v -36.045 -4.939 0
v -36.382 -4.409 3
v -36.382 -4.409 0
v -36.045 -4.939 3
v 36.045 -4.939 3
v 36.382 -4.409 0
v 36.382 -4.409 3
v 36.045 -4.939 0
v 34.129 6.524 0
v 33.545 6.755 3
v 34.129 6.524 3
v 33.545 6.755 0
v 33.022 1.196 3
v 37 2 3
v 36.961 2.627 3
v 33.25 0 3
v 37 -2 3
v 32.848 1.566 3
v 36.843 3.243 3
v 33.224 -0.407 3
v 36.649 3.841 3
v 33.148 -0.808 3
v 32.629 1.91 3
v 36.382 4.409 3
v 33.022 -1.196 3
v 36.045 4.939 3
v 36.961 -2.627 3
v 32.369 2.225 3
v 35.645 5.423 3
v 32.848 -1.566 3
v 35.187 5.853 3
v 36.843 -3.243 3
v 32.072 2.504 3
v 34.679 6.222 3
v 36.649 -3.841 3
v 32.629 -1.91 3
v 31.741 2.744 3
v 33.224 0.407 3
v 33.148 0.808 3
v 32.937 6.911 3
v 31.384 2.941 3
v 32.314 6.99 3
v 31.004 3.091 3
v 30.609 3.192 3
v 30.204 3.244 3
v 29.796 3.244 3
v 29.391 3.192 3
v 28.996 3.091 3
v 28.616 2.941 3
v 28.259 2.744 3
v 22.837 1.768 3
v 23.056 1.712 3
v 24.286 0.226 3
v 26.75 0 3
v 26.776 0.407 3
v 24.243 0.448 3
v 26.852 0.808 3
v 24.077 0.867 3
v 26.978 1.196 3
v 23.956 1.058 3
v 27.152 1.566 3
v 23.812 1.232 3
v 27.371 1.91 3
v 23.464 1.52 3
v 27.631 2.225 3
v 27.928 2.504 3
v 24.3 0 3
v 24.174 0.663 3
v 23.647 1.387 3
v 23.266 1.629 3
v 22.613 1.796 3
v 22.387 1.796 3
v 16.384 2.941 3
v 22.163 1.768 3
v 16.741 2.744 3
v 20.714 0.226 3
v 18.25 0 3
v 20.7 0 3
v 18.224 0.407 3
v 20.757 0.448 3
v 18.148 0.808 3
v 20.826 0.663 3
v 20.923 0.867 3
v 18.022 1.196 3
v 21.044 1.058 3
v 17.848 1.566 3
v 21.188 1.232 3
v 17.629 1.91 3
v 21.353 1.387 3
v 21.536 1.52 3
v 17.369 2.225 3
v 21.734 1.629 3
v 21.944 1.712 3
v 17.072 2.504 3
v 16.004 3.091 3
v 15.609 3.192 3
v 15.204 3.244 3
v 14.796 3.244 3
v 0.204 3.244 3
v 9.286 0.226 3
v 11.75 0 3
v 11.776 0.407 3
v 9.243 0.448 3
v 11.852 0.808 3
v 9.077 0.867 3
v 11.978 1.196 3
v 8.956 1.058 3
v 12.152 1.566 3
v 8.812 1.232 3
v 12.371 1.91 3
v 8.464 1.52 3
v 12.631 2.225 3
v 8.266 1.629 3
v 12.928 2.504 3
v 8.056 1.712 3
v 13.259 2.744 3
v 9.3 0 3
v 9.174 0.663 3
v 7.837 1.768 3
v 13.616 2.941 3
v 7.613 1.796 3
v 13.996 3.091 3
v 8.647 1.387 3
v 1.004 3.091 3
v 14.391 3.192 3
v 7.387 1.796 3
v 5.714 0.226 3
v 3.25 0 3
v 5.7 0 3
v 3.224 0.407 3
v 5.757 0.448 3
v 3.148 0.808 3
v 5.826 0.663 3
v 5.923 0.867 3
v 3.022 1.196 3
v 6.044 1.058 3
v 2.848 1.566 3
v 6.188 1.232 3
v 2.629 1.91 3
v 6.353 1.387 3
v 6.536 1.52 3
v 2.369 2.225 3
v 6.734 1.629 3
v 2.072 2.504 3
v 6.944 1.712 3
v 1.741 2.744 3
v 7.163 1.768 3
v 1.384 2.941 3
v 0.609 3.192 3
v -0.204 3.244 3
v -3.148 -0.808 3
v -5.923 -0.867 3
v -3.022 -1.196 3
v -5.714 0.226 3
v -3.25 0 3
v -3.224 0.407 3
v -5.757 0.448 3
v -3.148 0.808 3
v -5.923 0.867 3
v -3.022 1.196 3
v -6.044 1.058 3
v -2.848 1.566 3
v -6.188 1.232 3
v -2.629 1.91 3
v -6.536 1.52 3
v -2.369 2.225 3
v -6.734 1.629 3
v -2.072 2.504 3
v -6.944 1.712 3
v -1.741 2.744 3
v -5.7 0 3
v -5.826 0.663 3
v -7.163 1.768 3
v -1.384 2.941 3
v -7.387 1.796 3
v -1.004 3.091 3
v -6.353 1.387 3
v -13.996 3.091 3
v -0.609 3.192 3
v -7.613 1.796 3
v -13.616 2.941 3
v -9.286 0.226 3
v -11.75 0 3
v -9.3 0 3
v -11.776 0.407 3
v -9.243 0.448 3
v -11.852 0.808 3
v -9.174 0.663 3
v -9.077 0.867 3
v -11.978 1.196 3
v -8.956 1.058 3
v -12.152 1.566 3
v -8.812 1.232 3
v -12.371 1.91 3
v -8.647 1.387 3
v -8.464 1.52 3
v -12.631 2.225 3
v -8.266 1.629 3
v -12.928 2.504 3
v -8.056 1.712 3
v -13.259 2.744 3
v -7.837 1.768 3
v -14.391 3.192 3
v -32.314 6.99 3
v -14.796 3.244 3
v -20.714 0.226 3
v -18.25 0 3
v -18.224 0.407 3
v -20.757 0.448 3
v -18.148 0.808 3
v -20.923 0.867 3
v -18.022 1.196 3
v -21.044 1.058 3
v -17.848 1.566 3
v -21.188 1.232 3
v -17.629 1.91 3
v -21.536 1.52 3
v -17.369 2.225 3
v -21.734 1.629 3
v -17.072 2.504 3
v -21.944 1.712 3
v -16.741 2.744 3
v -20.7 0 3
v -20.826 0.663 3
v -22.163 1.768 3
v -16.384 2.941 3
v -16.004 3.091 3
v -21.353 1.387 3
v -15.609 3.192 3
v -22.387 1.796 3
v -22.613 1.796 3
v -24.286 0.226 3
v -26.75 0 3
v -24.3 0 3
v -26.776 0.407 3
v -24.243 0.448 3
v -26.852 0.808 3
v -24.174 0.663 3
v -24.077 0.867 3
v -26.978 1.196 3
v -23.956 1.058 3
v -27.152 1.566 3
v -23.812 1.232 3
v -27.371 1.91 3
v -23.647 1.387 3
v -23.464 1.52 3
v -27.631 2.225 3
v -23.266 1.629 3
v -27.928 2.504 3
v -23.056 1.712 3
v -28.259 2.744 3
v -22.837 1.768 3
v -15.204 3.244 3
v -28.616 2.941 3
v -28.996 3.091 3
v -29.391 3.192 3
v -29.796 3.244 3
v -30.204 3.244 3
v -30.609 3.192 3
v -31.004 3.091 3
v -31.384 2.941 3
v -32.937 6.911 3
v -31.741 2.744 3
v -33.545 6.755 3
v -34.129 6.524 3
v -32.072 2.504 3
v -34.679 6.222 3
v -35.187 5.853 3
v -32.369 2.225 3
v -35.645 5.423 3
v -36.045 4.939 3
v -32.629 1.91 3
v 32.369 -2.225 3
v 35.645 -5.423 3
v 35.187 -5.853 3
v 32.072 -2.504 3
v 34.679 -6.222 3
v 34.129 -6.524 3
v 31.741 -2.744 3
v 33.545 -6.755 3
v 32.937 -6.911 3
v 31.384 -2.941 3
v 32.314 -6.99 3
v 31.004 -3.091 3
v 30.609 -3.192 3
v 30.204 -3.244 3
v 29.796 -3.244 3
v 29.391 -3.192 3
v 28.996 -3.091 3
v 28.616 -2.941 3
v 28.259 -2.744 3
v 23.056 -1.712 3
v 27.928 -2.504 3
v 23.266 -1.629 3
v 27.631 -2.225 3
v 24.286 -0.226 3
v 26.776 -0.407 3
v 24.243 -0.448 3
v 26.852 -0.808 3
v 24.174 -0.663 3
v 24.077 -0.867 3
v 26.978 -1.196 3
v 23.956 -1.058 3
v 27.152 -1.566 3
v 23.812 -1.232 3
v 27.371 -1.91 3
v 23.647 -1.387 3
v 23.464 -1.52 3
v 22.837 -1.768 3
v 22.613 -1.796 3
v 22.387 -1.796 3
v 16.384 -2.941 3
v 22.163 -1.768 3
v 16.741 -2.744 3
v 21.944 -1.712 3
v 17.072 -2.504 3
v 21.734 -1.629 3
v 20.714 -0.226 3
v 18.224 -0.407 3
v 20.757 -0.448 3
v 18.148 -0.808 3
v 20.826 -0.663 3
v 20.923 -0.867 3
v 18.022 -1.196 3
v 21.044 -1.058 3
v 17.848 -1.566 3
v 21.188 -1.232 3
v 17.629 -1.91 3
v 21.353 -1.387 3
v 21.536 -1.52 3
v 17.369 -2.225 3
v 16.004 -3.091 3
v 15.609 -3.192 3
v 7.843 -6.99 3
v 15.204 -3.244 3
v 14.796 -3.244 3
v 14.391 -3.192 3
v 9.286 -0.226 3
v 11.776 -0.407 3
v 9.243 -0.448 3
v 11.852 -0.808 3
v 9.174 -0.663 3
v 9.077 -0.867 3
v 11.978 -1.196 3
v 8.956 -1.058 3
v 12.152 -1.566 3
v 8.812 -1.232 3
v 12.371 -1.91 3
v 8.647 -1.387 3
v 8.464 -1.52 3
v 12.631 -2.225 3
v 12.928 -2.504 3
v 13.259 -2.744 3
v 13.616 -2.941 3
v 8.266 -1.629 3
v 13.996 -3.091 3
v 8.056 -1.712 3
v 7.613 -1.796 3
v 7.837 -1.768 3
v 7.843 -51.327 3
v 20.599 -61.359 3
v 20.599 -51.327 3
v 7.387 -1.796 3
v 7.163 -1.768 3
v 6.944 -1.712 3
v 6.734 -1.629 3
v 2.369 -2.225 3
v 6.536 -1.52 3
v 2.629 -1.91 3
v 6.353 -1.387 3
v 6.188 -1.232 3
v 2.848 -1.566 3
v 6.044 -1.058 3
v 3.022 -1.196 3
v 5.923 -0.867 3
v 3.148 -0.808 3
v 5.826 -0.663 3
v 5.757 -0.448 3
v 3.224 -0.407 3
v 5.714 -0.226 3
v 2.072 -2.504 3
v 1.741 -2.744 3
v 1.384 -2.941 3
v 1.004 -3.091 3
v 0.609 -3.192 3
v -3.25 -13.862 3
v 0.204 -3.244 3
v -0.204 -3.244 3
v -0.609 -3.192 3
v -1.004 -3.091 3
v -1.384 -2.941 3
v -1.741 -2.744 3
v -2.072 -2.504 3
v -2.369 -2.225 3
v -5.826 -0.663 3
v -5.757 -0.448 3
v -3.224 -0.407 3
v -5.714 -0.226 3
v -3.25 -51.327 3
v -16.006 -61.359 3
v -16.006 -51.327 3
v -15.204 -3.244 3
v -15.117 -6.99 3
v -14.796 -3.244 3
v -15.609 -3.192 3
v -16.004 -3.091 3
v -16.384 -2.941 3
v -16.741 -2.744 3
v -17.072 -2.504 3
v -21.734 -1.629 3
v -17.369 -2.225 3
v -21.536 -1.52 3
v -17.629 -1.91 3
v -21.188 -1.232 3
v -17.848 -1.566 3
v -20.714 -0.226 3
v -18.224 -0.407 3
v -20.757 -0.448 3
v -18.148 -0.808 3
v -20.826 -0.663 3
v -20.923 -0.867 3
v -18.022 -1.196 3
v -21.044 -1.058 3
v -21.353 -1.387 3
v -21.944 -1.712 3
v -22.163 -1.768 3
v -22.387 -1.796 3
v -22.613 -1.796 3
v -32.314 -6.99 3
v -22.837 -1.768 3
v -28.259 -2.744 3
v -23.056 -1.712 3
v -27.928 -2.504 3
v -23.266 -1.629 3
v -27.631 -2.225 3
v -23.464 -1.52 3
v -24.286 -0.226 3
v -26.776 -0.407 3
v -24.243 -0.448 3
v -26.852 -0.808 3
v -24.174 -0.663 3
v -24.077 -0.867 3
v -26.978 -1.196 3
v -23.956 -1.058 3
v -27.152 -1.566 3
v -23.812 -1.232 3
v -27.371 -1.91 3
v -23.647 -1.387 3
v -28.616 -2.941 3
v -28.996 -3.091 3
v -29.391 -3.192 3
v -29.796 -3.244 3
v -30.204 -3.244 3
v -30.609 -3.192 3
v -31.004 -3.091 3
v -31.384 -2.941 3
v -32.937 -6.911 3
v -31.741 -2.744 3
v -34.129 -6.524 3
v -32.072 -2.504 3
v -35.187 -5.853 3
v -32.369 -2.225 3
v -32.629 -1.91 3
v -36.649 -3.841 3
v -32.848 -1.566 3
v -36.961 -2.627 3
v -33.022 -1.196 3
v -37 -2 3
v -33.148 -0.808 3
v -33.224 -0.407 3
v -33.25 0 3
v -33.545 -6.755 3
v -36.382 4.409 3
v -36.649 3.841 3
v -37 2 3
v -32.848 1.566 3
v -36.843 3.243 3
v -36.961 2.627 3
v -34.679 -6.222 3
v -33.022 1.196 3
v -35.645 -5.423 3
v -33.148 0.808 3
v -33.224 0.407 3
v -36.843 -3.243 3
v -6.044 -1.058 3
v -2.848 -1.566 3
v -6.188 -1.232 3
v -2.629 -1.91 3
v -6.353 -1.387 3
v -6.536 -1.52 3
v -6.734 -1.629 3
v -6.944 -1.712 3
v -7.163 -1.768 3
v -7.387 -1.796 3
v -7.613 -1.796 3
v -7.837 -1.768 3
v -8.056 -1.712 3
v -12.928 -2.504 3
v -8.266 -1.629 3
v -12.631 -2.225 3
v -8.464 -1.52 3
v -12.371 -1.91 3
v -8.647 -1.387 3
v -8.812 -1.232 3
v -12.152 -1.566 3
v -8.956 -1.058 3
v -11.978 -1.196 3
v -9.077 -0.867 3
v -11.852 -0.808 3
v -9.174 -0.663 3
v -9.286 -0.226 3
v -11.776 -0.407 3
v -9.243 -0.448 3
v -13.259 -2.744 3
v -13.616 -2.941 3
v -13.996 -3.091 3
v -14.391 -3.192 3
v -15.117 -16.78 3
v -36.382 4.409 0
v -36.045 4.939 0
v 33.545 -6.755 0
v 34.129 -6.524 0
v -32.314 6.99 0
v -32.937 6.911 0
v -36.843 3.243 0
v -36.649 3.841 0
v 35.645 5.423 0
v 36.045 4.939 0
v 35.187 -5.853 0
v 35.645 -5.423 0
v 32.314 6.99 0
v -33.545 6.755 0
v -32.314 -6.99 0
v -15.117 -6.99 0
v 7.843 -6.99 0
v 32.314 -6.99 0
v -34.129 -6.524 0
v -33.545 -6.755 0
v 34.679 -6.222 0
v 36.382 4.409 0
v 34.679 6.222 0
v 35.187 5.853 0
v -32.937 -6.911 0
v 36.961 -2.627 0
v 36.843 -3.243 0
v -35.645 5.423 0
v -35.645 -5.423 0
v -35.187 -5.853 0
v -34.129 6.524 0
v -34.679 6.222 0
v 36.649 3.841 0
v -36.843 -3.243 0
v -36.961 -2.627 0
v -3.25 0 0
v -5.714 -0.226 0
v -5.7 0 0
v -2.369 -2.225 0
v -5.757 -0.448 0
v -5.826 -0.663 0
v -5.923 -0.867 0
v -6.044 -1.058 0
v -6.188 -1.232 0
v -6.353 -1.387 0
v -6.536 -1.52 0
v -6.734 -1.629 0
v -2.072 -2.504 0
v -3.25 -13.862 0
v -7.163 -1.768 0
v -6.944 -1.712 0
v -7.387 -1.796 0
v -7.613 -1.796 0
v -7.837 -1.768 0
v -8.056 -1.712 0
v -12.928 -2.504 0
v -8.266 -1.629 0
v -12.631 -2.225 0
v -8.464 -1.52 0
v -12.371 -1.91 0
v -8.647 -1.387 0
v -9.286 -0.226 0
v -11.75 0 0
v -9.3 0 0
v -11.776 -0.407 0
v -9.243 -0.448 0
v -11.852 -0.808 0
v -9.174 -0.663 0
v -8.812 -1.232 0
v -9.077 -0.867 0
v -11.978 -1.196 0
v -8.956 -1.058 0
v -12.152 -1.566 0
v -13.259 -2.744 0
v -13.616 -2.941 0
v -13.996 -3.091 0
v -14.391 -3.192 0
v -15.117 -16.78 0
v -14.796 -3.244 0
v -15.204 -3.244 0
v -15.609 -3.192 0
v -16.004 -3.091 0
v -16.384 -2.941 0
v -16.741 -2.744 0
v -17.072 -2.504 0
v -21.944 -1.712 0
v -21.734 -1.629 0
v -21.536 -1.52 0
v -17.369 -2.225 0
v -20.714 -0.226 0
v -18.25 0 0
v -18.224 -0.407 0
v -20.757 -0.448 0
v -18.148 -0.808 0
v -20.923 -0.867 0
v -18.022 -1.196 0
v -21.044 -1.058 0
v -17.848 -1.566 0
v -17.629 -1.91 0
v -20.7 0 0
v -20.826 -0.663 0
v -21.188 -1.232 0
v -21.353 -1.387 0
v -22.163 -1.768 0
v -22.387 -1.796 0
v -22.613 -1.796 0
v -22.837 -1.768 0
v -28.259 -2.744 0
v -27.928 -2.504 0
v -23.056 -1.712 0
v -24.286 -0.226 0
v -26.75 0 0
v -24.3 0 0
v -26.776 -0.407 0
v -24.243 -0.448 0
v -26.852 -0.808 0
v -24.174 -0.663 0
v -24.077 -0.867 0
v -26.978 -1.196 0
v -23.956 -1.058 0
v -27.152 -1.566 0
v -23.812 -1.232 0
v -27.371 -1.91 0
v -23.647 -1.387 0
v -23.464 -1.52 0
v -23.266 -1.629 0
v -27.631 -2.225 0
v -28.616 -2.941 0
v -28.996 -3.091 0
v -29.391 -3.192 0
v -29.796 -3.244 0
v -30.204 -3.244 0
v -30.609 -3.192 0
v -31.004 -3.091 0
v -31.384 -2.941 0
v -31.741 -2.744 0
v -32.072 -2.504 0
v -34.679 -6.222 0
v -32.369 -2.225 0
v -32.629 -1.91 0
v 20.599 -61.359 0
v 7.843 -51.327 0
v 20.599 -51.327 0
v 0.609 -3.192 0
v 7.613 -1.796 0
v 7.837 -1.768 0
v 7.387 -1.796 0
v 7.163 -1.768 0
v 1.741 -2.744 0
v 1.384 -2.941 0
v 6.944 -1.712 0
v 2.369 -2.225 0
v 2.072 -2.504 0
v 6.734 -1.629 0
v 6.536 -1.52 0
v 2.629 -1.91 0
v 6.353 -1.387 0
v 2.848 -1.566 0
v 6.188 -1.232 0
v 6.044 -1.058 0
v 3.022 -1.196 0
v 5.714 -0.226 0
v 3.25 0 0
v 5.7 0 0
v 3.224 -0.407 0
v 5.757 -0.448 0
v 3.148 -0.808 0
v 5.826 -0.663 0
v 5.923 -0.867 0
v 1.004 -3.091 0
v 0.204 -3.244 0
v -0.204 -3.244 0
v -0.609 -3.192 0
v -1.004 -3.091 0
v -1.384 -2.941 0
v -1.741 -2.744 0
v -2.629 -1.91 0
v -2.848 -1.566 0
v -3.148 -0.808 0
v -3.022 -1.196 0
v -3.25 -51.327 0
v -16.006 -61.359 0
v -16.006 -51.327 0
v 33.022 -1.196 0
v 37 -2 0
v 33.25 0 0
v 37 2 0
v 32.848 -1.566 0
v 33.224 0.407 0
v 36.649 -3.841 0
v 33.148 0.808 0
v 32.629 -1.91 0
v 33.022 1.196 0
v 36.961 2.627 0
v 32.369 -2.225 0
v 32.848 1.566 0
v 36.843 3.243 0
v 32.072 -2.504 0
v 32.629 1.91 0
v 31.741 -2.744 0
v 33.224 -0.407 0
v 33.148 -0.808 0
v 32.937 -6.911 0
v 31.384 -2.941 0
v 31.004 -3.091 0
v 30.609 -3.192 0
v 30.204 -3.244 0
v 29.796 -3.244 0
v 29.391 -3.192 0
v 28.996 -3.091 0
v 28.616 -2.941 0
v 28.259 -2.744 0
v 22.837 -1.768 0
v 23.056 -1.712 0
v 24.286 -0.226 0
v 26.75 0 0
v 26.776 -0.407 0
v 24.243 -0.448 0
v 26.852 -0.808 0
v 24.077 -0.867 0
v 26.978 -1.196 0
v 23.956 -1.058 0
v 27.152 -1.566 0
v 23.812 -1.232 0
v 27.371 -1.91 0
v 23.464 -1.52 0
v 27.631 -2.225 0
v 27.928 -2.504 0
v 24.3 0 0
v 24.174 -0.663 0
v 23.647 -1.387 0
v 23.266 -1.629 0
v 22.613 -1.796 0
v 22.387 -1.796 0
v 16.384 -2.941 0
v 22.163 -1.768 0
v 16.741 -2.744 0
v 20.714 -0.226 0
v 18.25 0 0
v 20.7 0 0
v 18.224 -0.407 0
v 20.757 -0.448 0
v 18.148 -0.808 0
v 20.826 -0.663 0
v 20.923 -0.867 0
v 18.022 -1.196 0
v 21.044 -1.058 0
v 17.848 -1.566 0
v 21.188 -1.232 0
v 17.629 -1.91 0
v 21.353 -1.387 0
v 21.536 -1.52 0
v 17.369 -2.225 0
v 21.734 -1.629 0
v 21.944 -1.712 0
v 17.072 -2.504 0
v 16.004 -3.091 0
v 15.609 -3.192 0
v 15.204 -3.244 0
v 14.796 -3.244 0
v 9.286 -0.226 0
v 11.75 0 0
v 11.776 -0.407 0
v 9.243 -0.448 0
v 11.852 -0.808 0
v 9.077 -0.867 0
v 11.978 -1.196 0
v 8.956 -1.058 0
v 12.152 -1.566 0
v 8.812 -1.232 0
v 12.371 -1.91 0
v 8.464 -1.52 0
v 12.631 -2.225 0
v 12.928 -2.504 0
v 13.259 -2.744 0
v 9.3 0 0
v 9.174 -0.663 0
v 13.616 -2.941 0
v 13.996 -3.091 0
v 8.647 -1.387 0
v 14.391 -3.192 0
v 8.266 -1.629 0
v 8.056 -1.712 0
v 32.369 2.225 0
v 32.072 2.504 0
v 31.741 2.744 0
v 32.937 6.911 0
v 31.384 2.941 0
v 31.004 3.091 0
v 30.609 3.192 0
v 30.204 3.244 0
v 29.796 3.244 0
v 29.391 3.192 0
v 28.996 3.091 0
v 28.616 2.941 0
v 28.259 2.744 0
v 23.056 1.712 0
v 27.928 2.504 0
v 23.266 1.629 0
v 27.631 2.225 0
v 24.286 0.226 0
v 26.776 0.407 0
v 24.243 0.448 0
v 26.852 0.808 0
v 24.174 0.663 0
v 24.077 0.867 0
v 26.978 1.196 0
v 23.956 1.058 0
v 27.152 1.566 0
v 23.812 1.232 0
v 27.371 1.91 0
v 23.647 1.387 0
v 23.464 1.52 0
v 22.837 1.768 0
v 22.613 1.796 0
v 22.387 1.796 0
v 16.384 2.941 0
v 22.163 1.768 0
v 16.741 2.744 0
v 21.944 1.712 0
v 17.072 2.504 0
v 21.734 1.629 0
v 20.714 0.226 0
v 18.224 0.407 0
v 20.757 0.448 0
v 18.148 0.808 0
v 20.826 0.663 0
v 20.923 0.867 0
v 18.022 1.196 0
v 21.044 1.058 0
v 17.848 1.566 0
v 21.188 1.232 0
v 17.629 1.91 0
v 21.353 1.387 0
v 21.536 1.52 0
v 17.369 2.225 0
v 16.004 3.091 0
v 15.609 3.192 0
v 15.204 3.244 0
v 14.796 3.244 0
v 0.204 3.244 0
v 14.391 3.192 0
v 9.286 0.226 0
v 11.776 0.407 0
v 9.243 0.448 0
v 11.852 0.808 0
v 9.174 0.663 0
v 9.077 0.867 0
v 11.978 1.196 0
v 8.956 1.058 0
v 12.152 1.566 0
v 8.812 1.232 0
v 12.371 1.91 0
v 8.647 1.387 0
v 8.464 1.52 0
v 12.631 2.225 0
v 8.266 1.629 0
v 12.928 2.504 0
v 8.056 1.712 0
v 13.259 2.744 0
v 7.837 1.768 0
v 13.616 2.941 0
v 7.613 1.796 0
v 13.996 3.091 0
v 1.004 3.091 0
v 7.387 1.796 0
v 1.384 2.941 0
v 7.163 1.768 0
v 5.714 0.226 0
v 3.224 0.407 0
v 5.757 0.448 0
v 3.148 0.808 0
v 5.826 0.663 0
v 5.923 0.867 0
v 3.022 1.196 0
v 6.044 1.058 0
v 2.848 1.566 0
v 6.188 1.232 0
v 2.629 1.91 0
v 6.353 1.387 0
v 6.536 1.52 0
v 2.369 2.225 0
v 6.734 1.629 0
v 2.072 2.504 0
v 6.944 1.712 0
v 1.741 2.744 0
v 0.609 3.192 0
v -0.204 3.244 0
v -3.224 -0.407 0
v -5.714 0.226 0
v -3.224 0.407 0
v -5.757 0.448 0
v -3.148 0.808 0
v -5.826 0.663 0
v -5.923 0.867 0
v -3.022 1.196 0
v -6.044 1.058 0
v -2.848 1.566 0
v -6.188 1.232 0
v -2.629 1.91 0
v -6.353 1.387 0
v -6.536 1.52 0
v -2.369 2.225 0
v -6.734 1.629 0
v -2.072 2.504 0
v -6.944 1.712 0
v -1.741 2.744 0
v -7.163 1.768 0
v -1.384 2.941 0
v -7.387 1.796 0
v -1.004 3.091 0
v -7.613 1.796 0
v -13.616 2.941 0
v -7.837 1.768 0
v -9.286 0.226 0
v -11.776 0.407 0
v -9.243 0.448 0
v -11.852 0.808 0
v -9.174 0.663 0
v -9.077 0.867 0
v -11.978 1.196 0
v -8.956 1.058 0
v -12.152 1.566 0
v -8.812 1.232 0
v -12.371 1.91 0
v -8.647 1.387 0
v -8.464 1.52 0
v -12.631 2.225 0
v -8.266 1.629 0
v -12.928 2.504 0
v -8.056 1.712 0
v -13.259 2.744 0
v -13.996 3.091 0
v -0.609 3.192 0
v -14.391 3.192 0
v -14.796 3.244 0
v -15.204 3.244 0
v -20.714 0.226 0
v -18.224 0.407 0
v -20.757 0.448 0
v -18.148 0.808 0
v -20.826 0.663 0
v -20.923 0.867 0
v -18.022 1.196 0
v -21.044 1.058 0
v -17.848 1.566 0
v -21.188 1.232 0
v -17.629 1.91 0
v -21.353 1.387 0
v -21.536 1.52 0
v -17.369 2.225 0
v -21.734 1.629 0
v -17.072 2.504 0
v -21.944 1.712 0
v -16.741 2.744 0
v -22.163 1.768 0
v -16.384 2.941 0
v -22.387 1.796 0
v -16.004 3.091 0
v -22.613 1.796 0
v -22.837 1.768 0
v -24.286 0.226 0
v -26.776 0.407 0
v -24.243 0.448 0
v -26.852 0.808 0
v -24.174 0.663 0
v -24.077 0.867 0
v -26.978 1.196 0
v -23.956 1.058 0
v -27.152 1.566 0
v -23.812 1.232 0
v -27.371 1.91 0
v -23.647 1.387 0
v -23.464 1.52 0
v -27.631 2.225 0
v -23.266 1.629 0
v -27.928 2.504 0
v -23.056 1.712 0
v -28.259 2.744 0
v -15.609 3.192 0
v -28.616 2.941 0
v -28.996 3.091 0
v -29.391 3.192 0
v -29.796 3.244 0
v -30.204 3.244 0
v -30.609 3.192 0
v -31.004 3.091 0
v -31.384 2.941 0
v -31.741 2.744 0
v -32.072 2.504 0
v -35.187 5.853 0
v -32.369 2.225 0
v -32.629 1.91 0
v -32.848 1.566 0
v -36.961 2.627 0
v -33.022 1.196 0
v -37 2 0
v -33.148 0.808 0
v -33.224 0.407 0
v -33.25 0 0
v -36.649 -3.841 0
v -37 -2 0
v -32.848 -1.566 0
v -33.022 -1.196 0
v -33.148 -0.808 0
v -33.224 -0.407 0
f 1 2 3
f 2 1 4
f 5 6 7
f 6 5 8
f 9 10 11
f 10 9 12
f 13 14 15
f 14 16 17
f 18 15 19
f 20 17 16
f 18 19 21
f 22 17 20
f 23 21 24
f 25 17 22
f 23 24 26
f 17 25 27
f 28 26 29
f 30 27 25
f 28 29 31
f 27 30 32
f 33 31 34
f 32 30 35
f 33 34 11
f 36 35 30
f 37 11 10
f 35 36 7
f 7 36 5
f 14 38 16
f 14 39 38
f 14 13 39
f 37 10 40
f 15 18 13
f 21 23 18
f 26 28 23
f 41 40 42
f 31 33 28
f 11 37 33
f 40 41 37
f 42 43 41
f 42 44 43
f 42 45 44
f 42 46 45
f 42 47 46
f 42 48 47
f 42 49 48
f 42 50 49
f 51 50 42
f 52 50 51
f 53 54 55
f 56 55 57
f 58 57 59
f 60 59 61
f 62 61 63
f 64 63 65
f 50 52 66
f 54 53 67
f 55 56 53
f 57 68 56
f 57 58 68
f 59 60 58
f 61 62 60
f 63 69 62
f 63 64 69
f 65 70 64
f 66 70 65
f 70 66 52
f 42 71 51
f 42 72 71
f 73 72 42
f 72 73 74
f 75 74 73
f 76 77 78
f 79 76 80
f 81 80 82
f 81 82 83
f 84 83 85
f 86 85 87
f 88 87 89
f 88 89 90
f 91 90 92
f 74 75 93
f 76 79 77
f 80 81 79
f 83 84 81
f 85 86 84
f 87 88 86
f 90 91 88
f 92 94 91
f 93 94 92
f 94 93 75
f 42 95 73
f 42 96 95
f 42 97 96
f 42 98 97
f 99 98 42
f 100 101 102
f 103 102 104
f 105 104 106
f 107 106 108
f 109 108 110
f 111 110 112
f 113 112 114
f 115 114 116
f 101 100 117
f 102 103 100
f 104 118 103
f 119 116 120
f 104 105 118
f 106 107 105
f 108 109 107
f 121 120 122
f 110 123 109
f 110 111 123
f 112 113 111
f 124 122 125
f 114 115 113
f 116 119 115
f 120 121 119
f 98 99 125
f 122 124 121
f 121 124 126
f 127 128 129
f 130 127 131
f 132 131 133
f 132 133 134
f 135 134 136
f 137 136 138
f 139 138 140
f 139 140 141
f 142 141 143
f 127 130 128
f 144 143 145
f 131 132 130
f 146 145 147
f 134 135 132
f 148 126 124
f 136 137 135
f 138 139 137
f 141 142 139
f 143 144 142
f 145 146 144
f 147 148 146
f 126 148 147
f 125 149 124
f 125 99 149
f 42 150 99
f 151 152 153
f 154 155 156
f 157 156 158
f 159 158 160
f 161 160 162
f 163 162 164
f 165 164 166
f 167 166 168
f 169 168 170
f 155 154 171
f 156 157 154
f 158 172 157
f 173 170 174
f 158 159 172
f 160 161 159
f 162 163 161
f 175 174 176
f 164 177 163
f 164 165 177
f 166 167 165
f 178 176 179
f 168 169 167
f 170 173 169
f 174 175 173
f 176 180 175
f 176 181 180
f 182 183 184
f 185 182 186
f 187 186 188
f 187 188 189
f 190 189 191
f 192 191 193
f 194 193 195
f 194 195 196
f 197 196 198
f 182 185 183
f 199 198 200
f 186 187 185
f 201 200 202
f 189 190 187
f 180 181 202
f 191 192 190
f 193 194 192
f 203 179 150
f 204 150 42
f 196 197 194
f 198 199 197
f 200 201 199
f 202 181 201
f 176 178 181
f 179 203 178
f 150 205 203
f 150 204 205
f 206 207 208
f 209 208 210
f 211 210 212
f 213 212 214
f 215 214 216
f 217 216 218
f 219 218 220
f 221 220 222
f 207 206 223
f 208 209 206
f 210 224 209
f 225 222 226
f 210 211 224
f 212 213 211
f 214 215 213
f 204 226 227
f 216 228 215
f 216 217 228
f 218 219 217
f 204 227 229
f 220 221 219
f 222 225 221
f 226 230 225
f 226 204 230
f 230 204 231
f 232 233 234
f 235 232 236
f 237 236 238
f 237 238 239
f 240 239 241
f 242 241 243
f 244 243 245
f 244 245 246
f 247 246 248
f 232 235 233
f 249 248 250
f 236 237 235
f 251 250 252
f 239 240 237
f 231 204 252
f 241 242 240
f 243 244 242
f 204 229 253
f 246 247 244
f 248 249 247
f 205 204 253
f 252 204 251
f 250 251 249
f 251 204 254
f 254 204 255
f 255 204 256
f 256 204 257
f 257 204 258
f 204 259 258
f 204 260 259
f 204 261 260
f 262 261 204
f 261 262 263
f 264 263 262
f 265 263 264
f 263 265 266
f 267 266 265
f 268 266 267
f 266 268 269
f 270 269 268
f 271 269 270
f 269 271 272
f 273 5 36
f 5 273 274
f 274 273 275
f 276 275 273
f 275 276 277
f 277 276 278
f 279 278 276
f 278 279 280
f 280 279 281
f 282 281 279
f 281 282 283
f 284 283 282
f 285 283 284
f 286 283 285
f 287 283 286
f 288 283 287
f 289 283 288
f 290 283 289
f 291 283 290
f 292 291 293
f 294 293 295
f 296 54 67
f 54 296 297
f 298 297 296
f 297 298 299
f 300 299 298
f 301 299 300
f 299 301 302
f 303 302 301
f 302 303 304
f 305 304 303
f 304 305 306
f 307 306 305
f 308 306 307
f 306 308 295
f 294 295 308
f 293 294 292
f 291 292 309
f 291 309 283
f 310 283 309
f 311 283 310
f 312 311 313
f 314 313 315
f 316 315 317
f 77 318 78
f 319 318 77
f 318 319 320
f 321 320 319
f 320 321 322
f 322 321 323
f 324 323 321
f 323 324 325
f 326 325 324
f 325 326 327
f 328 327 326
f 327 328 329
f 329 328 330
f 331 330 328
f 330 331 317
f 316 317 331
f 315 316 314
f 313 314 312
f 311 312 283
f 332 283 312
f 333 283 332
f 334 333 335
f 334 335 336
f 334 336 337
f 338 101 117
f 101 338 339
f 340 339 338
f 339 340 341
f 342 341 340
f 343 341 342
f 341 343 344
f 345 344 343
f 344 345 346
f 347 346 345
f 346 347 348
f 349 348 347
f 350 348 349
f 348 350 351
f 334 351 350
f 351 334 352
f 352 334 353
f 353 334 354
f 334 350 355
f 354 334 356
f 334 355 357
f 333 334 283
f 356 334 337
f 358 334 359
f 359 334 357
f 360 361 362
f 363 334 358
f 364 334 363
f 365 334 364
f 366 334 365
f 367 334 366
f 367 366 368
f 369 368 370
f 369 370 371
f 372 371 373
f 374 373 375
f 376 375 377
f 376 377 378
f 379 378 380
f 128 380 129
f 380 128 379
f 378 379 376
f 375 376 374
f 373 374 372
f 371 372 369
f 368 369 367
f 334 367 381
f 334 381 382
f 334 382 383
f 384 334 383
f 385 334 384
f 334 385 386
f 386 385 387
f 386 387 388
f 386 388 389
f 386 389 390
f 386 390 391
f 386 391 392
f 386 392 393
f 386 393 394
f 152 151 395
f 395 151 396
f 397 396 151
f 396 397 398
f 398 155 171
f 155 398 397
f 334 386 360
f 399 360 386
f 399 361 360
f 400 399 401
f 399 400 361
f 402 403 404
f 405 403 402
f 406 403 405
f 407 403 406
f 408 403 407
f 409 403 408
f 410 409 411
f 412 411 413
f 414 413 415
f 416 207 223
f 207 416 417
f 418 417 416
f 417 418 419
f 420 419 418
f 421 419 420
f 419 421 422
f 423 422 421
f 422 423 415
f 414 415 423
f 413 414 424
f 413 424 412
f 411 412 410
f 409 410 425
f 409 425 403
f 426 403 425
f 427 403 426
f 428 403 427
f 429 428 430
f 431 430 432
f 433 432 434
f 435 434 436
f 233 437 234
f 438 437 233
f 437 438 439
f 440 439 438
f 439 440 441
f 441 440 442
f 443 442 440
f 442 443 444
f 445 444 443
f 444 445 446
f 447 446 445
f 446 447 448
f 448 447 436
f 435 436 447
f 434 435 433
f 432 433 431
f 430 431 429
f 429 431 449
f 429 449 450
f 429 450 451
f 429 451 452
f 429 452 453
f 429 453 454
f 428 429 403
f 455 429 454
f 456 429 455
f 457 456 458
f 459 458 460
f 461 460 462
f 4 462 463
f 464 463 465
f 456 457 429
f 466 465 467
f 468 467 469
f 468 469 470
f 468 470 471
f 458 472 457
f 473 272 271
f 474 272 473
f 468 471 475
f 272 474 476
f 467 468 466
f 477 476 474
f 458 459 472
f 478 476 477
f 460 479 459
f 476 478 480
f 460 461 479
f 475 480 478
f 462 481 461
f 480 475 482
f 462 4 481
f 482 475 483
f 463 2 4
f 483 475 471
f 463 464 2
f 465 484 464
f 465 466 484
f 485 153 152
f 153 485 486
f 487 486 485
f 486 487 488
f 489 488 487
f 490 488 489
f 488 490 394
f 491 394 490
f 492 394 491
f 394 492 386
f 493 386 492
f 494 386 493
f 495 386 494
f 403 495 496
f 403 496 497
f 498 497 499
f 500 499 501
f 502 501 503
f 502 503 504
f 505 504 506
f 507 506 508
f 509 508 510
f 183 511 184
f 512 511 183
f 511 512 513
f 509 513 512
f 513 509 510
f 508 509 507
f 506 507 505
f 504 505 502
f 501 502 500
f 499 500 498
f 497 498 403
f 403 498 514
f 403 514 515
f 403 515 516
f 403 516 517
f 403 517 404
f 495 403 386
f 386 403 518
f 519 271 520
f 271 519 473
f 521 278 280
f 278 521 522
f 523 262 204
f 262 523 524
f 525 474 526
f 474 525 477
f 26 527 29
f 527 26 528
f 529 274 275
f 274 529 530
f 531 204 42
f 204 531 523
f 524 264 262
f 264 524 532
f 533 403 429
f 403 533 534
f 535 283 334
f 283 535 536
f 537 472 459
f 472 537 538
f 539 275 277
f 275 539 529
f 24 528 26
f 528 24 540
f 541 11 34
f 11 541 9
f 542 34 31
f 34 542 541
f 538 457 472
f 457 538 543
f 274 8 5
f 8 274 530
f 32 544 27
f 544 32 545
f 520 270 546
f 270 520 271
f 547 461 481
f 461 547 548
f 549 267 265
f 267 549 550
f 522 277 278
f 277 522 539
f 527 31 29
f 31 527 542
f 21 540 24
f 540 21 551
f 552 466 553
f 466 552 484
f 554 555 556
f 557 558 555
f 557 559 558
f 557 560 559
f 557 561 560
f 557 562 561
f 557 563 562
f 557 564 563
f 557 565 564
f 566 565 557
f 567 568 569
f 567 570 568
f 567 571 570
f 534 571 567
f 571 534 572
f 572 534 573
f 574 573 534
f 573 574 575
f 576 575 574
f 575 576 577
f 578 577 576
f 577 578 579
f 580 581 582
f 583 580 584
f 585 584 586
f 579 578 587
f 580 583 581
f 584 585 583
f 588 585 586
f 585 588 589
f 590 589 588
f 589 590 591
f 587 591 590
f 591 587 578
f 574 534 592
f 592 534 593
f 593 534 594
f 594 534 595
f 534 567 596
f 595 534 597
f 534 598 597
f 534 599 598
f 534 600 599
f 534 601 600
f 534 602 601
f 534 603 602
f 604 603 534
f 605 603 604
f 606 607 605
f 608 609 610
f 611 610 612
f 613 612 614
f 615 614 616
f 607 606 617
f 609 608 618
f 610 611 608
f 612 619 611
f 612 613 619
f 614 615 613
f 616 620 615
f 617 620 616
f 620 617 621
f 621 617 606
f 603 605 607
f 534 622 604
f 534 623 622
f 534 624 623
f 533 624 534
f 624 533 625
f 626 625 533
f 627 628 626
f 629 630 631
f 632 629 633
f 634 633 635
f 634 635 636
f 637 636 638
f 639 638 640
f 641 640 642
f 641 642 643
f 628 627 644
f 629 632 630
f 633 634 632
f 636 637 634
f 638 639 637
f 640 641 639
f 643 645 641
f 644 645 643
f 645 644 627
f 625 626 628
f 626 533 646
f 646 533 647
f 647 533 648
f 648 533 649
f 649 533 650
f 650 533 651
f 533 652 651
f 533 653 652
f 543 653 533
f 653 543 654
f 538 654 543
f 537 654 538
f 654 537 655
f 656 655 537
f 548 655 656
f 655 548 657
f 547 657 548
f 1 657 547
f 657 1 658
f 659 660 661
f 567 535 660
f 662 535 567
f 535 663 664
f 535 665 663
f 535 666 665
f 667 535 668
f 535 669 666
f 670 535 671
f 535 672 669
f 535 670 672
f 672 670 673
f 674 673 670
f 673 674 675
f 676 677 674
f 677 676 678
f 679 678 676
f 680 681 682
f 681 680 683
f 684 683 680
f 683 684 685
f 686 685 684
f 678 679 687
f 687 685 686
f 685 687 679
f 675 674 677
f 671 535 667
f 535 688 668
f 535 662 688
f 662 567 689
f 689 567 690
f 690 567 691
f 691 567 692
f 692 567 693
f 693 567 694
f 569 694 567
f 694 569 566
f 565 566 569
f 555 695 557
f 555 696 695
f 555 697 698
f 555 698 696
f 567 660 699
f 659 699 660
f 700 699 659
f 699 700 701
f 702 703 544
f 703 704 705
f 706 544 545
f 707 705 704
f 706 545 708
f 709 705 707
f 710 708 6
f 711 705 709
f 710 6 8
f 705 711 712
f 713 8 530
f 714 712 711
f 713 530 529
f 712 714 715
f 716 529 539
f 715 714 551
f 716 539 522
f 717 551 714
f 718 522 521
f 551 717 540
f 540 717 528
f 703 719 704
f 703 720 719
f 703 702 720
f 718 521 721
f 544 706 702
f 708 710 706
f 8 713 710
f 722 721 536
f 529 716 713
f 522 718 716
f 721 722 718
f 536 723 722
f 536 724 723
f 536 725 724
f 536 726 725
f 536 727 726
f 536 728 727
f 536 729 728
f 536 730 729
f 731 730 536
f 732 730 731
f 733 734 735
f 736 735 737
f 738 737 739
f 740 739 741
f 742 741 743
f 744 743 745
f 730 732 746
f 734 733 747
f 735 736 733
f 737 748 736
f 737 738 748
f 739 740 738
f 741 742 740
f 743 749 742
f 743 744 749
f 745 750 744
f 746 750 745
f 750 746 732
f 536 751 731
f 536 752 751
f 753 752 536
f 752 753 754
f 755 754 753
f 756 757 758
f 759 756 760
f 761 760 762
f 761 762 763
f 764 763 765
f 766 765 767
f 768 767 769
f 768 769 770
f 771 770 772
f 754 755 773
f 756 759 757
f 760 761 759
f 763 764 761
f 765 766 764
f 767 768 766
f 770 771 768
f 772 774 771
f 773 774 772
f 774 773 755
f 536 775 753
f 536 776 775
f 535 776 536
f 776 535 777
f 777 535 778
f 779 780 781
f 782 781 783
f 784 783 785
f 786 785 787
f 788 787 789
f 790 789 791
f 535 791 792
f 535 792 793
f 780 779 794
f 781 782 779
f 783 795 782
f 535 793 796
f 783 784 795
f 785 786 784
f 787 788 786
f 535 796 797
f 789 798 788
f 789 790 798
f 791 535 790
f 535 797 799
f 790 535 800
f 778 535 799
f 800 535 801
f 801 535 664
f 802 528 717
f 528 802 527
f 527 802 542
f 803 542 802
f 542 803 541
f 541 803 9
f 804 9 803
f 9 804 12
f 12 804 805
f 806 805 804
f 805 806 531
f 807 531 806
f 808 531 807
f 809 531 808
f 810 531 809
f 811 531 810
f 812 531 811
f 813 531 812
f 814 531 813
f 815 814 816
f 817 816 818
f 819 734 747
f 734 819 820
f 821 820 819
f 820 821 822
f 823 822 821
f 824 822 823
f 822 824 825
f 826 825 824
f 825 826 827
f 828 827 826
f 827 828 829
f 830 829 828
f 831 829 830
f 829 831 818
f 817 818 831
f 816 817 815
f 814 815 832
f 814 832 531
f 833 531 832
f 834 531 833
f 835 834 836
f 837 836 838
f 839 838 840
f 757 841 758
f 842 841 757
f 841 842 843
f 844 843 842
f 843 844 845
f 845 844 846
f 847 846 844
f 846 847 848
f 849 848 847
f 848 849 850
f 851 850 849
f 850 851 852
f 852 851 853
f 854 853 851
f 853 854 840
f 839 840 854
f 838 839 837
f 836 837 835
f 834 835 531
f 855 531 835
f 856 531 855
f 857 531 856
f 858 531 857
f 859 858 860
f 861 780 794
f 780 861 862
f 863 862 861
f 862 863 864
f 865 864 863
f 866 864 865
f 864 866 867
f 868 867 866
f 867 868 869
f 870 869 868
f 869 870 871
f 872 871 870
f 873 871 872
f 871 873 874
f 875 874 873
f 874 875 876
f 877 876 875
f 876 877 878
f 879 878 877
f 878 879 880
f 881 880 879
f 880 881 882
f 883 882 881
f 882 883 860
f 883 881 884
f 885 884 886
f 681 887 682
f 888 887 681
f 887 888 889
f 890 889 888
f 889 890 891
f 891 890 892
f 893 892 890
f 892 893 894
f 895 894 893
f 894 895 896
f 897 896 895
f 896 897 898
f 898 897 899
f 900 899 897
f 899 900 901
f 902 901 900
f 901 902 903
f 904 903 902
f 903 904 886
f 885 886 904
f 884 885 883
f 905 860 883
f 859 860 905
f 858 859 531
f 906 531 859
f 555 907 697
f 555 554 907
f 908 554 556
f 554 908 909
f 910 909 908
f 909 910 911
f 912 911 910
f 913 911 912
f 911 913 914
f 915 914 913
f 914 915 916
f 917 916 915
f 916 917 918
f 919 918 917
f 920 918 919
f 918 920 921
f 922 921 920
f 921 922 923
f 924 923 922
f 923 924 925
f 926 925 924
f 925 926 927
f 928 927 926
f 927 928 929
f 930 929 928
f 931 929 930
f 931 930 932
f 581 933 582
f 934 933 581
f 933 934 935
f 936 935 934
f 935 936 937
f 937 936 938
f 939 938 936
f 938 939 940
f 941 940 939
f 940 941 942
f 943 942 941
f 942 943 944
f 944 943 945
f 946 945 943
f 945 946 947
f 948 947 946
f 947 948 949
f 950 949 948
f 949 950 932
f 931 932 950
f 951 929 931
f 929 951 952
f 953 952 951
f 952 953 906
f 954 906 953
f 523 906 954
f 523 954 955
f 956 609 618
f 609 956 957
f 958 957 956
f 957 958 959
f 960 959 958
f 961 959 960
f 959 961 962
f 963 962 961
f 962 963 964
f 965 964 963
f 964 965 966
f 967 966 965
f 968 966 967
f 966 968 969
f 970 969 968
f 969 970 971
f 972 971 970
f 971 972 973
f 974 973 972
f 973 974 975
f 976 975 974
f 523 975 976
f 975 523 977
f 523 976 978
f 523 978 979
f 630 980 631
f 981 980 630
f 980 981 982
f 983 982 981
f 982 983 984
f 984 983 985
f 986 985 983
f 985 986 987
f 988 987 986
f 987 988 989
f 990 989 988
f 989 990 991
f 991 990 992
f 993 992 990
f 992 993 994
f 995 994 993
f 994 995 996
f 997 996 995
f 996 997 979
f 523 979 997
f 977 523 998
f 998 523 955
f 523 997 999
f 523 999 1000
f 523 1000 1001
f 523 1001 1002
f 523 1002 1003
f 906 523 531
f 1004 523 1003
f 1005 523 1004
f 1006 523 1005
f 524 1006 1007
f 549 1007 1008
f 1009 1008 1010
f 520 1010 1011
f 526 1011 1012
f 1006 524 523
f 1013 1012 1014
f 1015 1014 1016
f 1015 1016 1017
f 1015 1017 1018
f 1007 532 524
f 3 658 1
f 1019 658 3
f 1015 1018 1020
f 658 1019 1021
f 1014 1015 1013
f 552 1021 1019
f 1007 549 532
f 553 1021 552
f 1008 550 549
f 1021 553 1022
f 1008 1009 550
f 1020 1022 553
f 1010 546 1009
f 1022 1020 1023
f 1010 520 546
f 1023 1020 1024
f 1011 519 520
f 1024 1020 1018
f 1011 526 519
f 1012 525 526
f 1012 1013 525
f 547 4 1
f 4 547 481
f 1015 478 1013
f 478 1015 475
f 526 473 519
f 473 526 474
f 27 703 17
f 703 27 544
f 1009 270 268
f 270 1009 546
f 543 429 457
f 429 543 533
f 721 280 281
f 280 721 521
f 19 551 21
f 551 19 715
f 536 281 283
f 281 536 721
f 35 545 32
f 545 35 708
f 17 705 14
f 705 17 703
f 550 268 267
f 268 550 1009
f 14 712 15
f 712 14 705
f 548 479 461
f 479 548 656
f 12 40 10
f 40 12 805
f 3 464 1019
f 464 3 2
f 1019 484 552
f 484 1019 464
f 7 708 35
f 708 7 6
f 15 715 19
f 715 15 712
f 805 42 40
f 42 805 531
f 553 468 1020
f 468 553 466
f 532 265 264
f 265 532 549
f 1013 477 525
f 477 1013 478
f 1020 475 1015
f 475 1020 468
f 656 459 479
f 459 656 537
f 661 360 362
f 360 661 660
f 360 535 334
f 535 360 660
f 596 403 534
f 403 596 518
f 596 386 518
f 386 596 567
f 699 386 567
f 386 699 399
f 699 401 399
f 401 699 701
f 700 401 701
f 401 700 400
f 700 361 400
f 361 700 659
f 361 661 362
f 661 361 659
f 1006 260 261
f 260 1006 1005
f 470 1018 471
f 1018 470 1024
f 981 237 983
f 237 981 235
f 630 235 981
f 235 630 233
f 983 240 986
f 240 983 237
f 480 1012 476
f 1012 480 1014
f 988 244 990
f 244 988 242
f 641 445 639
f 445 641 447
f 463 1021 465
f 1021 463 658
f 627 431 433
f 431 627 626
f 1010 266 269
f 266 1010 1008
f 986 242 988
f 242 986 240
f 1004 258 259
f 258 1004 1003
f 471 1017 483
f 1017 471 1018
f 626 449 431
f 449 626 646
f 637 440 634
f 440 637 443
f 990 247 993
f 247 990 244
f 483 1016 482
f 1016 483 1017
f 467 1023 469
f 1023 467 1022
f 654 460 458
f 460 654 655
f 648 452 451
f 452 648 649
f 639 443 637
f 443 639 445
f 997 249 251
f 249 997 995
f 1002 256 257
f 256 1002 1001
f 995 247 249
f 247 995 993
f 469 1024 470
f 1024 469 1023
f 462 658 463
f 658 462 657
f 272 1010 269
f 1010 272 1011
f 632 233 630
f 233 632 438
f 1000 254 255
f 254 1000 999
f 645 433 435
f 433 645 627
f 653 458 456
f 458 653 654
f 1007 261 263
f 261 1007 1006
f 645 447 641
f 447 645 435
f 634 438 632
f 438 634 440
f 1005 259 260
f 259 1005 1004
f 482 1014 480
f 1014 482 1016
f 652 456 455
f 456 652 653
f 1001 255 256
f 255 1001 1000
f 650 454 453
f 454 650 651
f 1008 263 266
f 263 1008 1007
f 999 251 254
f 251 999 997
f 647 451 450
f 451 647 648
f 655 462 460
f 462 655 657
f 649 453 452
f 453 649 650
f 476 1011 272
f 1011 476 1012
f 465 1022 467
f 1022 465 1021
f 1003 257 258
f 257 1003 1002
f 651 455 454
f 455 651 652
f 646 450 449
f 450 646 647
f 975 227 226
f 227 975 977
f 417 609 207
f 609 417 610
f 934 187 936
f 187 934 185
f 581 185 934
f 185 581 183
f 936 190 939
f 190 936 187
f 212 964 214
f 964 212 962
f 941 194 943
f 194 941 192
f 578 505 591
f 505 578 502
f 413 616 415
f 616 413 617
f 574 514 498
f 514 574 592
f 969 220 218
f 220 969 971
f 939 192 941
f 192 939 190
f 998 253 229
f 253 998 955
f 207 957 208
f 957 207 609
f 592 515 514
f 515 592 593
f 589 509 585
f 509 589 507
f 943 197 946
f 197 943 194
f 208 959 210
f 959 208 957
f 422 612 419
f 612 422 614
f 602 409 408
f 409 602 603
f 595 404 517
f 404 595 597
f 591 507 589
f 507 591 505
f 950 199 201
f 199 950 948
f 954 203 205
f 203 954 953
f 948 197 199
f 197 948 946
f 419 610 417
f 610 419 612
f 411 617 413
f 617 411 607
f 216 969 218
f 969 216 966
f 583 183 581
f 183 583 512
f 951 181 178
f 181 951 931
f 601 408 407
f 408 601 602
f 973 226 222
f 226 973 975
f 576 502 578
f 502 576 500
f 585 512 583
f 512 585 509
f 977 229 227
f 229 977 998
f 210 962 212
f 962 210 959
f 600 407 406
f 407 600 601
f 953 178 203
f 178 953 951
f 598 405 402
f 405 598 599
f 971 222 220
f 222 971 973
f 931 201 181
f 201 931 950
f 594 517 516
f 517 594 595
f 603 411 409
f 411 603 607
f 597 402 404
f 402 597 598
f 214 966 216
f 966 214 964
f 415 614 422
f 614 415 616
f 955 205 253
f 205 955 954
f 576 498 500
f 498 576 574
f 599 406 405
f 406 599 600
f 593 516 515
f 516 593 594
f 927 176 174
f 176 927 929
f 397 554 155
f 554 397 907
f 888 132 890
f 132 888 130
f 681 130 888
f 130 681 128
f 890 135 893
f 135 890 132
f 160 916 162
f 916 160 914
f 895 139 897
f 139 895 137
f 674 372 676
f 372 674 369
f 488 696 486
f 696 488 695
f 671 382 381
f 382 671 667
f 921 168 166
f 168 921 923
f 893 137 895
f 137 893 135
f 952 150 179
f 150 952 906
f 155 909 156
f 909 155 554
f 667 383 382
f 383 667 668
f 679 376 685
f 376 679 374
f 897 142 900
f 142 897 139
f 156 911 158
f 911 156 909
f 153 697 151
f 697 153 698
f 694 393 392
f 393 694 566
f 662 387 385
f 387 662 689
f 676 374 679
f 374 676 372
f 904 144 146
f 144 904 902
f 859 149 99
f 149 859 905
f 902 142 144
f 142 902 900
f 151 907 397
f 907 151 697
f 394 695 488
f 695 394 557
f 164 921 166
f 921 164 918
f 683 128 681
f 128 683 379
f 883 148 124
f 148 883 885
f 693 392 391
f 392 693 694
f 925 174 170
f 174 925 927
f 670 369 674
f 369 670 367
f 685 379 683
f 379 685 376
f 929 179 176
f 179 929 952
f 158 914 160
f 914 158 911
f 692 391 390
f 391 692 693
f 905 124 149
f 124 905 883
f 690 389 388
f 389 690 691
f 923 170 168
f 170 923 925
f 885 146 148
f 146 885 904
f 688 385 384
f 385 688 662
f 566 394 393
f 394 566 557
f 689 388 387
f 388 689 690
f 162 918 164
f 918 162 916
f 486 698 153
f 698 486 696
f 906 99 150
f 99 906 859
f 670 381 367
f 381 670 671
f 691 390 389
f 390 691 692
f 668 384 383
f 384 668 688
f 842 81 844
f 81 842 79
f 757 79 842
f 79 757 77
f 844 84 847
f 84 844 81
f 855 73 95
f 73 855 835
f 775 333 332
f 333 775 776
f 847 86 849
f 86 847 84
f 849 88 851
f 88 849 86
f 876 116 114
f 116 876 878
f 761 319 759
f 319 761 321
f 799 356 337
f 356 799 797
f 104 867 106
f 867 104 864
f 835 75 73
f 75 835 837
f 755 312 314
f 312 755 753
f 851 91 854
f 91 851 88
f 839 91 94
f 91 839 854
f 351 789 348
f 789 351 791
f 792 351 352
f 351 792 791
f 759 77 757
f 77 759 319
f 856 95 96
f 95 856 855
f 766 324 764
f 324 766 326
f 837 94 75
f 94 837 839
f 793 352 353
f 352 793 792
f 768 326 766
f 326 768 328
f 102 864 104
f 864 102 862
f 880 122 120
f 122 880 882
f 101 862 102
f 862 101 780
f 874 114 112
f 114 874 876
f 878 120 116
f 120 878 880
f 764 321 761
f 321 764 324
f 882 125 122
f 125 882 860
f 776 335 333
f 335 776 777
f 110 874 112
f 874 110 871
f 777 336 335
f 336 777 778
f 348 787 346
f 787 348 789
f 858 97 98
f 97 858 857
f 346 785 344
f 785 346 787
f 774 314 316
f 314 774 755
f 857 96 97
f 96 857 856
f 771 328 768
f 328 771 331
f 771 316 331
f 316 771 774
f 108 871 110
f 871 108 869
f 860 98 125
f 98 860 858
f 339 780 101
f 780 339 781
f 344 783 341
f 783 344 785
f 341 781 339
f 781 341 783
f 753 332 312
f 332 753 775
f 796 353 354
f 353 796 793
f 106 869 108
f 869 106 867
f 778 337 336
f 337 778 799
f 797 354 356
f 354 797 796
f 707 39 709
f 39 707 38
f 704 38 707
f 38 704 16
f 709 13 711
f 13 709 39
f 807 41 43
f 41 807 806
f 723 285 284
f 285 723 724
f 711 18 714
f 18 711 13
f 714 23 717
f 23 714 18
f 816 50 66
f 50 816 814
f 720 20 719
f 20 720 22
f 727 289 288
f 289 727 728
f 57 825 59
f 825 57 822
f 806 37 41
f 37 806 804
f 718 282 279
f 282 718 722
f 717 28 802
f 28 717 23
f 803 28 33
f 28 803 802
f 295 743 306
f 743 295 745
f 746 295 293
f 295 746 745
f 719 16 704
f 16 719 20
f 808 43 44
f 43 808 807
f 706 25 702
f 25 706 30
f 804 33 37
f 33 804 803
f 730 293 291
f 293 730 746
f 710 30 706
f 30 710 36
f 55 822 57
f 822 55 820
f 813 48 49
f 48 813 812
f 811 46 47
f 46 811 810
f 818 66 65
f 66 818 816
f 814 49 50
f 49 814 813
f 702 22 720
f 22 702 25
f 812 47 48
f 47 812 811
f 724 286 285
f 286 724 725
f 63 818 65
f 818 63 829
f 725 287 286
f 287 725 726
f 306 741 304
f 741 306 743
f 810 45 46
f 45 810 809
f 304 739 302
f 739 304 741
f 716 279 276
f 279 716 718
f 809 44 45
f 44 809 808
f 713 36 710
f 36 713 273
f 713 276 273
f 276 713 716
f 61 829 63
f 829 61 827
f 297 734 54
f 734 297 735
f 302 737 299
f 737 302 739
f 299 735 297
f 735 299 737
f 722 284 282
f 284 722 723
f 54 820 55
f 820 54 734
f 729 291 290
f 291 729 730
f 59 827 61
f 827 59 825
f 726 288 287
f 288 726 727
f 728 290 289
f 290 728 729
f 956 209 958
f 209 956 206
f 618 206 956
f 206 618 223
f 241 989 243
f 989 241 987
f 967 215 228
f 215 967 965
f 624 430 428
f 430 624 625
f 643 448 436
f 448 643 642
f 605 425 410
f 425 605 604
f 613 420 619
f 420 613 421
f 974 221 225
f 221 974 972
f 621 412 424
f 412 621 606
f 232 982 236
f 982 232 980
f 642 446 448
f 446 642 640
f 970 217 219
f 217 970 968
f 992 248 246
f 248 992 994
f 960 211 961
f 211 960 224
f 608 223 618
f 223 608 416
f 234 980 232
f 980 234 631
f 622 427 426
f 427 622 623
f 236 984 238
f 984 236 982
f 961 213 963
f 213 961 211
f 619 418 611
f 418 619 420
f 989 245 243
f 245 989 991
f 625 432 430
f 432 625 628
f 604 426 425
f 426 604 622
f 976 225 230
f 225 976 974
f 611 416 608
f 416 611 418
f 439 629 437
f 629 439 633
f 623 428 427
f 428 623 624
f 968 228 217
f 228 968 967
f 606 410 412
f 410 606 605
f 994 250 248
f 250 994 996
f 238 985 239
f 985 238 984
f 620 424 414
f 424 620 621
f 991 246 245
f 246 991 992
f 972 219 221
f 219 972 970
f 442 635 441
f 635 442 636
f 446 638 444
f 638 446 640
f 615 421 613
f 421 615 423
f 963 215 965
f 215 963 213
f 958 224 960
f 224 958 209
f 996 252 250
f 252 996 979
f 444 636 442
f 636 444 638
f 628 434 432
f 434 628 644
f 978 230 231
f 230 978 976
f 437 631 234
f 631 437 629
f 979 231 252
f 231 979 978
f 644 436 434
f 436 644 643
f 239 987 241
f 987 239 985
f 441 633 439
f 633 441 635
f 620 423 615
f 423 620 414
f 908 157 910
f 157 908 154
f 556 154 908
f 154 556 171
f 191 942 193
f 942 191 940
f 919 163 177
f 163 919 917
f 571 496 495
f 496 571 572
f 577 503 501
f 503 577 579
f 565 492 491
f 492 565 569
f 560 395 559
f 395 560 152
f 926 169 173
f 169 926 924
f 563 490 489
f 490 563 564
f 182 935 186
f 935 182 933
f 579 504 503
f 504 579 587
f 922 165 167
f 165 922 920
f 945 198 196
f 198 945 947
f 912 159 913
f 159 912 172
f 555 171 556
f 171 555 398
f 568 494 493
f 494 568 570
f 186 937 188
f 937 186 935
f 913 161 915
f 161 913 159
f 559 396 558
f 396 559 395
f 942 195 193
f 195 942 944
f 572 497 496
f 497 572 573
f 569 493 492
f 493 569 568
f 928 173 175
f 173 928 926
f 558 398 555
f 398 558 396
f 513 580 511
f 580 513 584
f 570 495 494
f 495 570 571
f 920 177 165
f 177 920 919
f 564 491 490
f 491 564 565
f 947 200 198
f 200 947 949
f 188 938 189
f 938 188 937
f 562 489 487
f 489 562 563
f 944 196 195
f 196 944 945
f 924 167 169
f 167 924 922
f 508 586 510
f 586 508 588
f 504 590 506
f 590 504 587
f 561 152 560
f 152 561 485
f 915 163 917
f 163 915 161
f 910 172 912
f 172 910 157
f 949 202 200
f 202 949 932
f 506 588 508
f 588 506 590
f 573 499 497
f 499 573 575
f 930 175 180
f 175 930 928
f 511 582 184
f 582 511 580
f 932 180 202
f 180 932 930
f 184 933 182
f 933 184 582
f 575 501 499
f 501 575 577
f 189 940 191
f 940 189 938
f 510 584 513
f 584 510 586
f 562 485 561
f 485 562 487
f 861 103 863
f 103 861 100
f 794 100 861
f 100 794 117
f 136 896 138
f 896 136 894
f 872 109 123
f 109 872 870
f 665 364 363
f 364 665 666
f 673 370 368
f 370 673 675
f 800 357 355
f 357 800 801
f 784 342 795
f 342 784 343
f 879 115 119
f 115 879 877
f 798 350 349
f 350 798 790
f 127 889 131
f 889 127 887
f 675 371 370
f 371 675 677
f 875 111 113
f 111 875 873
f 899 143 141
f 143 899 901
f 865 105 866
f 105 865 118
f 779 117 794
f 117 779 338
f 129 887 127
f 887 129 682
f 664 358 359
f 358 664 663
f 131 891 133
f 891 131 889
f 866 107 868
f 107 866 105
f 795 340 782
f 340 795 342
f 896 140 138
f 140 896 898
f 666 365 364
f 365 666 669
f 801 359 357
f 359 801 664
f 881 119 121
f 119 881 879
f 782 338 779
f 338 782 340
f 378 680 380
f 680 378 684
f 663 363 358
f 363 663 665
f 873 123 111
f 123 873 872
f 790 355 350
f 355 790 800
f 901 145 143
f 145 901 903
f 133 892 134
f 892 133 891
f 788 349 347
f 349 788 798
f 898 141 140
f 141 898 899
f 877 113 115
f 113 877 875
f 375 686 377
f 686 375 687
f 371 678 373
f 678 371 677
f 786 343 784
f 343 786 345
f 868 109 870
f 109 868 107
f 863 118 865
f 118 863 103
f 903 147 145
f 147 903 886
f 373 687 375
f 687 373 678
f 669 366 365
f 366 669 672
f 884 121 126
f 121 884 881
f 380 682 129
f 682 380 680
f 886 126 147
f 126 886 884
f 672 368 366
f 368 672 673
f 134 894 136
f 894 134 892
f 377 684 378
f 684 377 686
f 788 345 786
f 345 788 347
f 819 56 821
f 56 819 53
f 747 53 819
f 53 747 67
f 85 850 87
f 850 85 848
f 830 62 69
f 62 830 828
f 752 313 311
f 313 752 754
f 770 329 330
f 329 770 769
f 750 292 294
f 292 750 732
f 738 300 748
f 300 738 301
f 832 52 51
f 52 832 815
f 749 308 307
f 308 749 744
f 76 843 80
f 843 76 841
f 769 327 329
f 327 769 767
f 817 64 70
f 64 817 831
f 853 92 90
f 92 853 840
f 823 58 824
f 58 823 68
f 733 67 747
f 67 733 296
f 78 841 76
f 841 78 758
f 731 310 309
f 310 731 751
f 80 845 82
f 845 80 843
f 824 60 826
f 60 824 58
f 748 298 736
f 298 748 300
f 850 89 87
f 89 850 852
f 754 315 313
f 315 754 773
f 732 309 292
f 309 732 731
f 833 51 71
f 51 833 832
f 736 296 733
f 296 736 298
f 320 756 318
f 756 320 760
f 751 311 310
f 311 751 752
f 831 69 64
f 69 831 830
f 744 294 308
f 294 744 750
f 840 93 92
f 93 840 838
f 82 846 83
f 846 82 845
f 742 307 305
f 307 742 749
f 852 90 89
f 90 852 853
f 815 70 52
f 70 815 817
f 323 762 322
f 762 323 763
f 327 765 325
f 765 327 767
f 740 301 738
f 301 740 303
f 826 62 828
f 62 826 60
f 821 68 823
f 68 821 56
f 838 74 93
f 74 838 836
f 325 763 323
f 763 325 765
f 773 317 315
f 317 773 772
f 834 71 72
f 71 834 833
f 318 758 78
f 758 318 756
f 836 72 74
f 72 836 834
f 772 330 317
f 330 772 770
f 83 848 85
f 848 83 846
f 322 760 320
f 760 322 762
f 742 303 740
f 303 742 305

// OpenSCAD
$fn = 50;


difference() {
	union() {
		hull() {
			translate(v = [-32.0000000000, 2.0000000000, 0]) {
				cylinder(h = 3, r = 5);
			}
			translate(v = [32.0000000000, 2.0000000000, 0]) {
				cylinder(h = 3, r = 5);
			}
			translate(v = [-32.0000000000, -2.0000000000, 0]) {
				cylinder(h = 3, r = 5);
			}
			translate(v = [32.0000000000, -2.0000000000, 0]) {
				cylinder(h = 3, r = 5);
			}
		}
		translate(v = [0, -5, 0]) {
			linear_extrude(height = 3) {
				text(font = "DejaVu Sans Mono:style=Bold", halign = "center", size = 57.0000000000, text = "1", valign = "top");
			}
		}
	}
	union() {
		translate(v = [-30.0000000000, 0.0000000000, 0]) {
			translate(v = [0, 0, -100]) {
				cylinder(h = 200, r = 3.2500000000);
			}
		}
		translate(v = [-15.0000000000, 0.0000000000, 0]) {
			translate(v = [0, 0, -100]) {
				cylinder(h = 200, r = 3.2500000000);
			}
		}
		translate(v = [0, 0, -100]) {
			cylinder(h = 200, r = 3.2500000000);
		}
		translate(v = [15.0000000000, 0.0000000000, 0]) {
			translate(v = [0, 0, -100]) {
				cylinder(h = 200, r = 3.2500000000);
			}
		}
		translate(v = [30.0000000000, 0.0000000000, 0]) {
			translate(v = [0, 0, -100]) {
				cylinder(h = 200, r = 3.2500000000);
			}
		}
		translate(v = [-30.0000000000, 0.0000000000, 0]) {
			translate(v = [0, 0, -100]) {
				cylinder(h = 200, r = 1.8000000000);
			}
		}
		translate(v = [-22.5000000000, 0.0000000000, 0]) {
			translate(v = [0, 0, -100]) {
				cylinder(h = 200, r = 1.8000000000);
			}
		}
		translate(v = [-15.0000000000, 0.0000000000, 0]) {
			translate(v = [0, 0, -100]) {
				cylinder(h = 200, r = 1.8000000000);
			}
		}
		translate(v = [-7.5000000000, 0.0000000000, 0]) {
			translate(v = [0, 0, -100]) {
				cylinder(h = 200, r = 1.8000000000);
			}
		}
		translate(v = [0, 0, -100]) {
			cylinder(h = 200, r = 1.8000000000);
		}
		translate(v = [7.5000000000, 0.0000000000, 0]) {
			translate(v = [0, 0, -100]) {
				cylinder(h = 200, r = 1.8000000000);
			}
		}
		translate(v = [15.0000000000, 0.0000000000, 0]) {
			translate(v = [0, 0, -100]) {
				cylinder(h = 200, r = 1.8000000000);
			}
		}
		translate(v = [22.5000000000, 0.0000000000, 0]) {
			translate(v = [0, 0, -100]) {
				cylinder(h = 200, r = 1.8000000000);
			}
		}
		translate(v = [30.0000000000, 0.0000000000, 0]) {
			translate(v = [0, 0, -100]) {
				cylinder(h = 200, r = 1.8000000000);
			}
		}
	}
}
